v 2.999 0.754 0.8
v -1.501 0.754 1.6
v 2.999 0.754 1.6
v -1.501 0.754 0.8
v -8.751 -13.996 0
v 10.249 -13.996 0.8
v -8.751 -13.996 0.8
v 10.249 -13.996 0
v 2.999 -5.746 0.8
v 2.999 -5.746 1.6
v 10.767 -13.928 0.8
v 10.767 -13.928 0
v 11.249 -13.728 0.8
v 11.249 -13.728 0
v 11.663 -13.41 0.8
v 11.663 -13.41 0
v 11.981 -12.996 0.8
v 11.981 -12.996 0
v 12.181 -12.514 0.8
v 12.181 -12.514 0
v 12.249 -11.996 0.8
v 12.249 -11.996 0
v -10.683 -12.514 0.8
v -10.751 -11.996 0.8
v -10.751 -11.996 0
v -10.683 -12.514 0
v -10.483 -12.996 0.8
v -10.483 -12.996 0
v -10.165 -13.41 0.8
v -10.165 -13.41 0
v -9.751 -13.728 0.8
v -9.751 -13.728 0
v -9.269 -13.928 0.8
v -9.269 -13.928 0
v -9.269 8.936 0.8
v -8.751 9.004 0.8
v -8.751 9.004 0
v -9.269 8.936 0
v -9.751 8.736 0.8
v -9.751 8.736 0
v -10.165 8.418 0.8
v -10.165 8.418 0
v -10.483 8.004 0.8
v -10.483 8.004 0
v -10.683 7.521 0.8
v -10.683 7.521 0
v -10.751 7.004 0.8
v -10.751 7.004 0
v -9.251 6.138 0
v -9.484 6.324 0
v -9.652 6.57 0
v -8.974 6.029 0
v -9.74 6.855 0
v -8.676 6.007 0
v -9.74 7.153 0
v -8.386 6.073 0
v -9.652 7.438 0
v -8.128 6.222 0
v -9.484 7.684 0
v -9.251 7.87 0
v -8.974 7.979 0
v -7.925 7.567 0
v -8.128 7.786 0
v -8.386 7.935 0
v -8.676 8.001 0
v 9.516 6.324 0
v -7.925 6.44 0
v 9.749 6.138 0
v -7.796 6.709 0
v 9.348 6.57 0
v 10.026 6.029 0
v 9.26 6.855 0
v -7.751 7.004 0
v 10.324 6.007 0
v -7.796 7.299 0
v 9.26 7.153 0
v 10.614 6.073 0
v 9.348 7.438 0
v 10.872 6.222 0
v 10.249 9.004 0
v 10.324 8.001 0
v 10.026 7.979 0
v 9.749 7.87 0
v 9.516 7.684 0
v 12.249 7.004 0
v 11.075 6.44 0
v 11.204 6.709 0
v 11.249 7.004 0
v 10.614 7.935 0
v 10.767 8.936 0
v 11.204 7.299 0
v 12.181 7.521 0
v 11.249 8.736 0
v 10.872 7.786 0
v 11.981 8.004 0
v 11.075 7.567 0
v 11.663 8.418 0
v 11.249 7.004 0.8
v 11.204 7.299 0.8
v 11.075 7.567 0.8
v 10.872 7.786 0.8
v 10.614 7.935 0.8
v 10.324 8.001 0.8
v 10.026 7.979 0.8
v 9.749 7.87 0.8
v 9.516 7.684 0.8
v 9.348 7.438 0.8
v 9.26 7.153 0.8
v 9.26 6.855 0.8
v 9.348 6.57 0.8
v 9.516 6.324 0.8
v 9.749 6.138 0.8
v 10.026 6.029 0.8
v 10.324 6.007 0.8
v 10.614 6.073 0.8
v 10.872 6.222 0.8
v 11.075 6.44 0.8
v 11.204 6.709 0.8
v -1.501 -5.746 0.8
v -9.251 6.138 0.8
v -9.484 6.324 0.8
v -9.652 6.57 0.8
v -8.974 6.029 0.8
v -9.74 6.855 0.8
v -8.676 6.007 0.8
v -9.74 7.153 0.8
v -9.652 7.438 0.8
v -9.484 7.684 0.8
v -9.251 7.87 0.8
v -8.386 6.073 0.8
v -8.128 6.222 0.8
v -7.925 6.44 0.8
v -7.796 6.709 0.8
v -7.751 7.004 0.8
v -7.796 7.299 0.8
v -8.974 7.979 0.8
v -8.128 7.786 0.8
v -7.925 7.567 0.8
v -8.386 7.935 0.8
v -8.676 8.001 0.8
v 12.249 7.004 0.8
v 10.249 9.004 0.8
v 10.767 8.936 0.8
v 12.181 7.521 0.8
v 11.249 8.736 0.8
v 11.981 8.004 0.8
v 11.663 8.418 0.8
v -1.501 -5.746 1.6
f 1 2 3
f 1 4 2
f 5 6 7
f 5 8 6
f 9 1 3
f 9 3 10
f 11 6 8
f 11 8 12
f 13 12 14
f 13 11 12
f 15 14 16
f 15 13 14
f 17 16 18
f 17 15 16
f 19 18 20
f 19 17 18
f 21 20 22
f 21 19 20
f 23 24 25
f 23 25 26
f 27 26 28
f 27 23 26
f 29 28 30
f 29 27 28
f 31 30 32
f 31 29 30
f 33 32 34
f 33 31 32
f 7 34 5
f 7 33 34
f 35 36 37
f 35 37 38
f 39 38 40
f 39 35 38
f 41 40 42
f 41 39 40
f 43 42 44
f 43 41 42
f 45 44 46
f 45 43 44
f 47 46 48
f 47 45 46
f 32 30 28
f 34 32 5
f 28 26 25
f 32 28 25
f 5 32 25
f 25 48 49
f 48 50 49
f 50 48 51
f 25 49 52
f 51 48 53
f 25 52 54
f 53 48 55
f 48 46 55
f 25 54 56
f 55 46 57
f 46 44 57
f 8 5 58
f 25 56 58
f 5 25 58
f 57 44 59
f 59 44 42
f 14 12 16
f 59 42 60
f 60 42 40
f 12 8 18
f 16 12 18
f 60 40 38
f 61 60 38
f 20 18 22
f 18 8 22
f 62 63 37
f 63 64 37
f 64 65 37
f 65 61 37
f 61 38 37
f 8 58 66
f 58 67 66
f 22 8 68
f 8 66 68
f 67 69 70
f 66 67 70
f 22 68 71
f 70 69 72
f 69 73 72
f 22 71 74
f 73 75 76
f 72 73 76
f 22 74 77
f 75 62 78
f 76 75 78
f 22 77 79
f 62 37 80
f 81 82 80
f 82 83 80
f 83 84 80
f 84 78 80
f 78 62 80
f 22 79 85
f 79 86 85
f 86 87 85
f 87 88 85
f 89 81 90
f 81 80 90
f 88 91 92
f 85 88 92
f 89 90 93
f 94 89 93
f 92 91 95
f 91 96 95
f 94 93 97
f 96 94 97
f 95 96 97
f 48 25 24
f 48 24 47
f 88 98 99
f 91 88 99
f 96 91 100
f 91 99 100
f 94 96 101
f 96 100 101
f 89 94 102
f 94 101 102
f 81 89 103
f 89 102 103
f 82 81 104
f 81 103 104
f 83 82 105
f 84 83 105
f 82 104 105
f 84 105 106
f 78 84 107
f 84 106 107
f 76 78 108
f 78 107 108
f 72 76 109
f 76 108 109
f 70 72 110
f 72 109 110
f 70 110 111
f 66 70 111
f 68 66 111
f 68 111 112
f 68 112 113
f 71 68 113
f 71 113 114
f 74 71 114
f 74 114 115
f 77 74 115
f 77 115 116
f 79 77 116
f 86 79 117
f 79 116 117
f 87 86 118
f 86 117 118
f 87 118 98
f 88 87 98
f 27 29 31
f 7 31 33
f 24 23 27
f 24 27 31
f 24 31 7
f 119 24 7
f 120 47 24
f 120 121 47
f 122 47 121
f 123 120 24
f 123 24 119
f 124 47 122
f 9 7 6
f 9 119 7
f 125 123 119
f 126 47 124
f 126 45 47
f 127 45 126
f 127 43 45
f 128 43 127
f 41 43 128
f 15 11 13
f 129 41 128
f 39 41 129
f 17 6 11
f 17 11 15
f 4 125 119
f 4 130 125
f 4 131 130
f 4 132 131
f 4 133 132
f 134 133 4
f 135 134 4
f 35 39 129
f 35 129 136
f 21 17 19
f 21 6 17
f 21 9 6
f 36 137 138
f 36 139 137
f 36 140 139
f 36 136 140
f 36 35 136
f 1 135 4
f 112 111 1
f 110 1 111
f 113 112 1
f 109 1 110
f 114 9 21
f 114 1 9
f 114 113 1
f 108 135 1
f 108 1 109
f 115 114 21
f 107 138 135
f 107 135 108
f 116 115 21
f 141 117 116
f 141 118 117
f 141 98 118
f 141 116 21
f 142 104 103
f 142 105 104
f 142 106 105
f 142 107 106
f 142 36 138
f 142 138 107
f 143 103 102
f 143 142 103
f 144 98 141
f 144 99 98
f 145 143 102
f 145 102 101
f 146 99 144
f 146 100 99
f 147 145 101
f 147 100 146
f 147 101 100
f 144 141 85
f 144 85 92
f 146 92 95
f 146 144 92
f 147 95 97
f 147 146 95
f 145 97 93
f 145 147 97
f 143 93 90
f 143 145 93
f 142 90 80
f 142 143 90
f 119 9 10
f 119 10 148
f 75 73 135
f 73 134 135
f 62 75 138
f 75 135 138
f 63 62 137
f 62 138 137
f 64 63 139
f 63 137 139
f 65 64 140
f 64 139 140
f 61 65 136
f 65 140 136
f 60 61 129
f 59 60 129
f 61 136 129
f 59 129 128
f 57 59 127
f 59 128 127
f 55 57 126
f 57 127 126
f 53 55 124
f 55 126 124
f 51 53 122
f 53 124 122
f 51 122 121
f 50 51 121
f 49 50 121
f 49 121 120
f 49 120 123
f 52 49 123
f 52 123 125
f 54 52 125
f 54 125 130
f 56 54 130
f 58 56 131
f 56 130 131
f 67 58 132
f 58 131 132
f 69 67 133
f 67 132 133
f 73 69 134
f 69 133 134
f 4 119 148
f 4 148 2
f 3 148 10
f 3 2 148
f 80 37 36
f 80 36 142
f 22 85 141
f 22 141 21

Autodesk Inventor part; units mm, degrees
ref_plane "YZ Plane" through (0, 0, 0) normal (1, 0, 0) x (0, 1, 0)
ref_plane "XZ Plane" through (0, 0, 0) normal (0, 1, 0) x (-1, 0, 0)
ref_plane "XY Plane" through (0, 0, 0) normal (0, 0, 1) x (1, 0, 0)
sketch "Sketch1" plane through (0, 0, 0) normal (0, 0, 1) x (1, 0, 0)
  line L0 (-10.7511, 9.0038) -> (12.2489, 9.0038)
  line L1 (12.2489, 9.0038) -> (12.2489, -13.9962)
  line L2 (12.2489, -13.9962) -> (-10.7511, -13.9962)
  line L3 (-10.7511, -13.9962) -> (-10.7511, 9.0038)
  point P0 (0, 0)
  dimension "d0" = 23
  dimension "d1" = 23
extrude "Extrusion1" add sketch "Sketch1" along normal blind 0.8
fillet "Fillet1" radius 2 4 edges at (12.2489, 9.0038, 0.4) (-10.7511, 9.0038, 0.4) (12.2489, -13.9962, 0.4) (-10.7511, -13.9962, 0.4)
sketch "Sketch2" plane through (0, 0, 0.8) normal (0, 0, 1) x (1, 0, 0)
  arc A0 (-8.7511, 9.0038) -> (-10.7511, 7.0038) centre (-8.7511, 7.0038) ccw projected
  circle A1 centre (-8.7511, 7.0038) radius 1
  arc A2 (12.2489, 7.0038) -> (10.2489, 9.0038) centre (10.2489, 7.0038) ccw projected
  circle A3 centre (10.2489, 7.0038) radius 1
  point P0 (0, 0)
  dimension "d5" = 2
  dimension "d6" = 2
extrude "Extrusion2" cut sketch "Sketch2" against normal blind 0.8
sketch "Sketch3" plane through (0, 0, 0.8) normal (0, 0, 1) x (1, 0, 0)
  line L0 (10.2489, 9.0038) -> (-8.7511, 9.0038) projected
  line L1 (-8.7511, -13.9962) -> (10.2489, -13.9962) projected
  line L2 (0.7489, 9.0038) -> (10.2489, 9.0038)
  line L3 (10.2489, 9.0038) -> (10.2489, -13.9962)
  line L4 (10.2489, -13.9962) -> (0.7489, -13.9962)
  line L5 (0.7489, -13.9962) -> (0.7489, 9.0038)
  line L6 (2.9989, -5.7462) -> (-1.5011, -5.7462)
  line L7 (-1.5011, -5.7462) -> (-1.5011, 0.7538)
  line L8 (-1.5011, 0.7538) -> (2.9989, 0.7538)
  line L9 (2.9989, 0.7538) -> (2.9989, -5.7462)
  line L10 (2.9989, -5.7462) -> (-1.5011, 0.7538) construction
  line L11 (-1.5011, -5.7462) -> (2.9989, 0.7538) construction
  point P0 (0, 0)
  point P1 (0.7489, -2.4962)
  dimension "d9" = 4.5
  dimension "d10" = 6.5
extrude "Extrusion3" add sketch "Sketch3" along normal blind 0.8 contours L8 L9 L6 L5 | L5 L6 L7 L8
properties part number "Encoder"
